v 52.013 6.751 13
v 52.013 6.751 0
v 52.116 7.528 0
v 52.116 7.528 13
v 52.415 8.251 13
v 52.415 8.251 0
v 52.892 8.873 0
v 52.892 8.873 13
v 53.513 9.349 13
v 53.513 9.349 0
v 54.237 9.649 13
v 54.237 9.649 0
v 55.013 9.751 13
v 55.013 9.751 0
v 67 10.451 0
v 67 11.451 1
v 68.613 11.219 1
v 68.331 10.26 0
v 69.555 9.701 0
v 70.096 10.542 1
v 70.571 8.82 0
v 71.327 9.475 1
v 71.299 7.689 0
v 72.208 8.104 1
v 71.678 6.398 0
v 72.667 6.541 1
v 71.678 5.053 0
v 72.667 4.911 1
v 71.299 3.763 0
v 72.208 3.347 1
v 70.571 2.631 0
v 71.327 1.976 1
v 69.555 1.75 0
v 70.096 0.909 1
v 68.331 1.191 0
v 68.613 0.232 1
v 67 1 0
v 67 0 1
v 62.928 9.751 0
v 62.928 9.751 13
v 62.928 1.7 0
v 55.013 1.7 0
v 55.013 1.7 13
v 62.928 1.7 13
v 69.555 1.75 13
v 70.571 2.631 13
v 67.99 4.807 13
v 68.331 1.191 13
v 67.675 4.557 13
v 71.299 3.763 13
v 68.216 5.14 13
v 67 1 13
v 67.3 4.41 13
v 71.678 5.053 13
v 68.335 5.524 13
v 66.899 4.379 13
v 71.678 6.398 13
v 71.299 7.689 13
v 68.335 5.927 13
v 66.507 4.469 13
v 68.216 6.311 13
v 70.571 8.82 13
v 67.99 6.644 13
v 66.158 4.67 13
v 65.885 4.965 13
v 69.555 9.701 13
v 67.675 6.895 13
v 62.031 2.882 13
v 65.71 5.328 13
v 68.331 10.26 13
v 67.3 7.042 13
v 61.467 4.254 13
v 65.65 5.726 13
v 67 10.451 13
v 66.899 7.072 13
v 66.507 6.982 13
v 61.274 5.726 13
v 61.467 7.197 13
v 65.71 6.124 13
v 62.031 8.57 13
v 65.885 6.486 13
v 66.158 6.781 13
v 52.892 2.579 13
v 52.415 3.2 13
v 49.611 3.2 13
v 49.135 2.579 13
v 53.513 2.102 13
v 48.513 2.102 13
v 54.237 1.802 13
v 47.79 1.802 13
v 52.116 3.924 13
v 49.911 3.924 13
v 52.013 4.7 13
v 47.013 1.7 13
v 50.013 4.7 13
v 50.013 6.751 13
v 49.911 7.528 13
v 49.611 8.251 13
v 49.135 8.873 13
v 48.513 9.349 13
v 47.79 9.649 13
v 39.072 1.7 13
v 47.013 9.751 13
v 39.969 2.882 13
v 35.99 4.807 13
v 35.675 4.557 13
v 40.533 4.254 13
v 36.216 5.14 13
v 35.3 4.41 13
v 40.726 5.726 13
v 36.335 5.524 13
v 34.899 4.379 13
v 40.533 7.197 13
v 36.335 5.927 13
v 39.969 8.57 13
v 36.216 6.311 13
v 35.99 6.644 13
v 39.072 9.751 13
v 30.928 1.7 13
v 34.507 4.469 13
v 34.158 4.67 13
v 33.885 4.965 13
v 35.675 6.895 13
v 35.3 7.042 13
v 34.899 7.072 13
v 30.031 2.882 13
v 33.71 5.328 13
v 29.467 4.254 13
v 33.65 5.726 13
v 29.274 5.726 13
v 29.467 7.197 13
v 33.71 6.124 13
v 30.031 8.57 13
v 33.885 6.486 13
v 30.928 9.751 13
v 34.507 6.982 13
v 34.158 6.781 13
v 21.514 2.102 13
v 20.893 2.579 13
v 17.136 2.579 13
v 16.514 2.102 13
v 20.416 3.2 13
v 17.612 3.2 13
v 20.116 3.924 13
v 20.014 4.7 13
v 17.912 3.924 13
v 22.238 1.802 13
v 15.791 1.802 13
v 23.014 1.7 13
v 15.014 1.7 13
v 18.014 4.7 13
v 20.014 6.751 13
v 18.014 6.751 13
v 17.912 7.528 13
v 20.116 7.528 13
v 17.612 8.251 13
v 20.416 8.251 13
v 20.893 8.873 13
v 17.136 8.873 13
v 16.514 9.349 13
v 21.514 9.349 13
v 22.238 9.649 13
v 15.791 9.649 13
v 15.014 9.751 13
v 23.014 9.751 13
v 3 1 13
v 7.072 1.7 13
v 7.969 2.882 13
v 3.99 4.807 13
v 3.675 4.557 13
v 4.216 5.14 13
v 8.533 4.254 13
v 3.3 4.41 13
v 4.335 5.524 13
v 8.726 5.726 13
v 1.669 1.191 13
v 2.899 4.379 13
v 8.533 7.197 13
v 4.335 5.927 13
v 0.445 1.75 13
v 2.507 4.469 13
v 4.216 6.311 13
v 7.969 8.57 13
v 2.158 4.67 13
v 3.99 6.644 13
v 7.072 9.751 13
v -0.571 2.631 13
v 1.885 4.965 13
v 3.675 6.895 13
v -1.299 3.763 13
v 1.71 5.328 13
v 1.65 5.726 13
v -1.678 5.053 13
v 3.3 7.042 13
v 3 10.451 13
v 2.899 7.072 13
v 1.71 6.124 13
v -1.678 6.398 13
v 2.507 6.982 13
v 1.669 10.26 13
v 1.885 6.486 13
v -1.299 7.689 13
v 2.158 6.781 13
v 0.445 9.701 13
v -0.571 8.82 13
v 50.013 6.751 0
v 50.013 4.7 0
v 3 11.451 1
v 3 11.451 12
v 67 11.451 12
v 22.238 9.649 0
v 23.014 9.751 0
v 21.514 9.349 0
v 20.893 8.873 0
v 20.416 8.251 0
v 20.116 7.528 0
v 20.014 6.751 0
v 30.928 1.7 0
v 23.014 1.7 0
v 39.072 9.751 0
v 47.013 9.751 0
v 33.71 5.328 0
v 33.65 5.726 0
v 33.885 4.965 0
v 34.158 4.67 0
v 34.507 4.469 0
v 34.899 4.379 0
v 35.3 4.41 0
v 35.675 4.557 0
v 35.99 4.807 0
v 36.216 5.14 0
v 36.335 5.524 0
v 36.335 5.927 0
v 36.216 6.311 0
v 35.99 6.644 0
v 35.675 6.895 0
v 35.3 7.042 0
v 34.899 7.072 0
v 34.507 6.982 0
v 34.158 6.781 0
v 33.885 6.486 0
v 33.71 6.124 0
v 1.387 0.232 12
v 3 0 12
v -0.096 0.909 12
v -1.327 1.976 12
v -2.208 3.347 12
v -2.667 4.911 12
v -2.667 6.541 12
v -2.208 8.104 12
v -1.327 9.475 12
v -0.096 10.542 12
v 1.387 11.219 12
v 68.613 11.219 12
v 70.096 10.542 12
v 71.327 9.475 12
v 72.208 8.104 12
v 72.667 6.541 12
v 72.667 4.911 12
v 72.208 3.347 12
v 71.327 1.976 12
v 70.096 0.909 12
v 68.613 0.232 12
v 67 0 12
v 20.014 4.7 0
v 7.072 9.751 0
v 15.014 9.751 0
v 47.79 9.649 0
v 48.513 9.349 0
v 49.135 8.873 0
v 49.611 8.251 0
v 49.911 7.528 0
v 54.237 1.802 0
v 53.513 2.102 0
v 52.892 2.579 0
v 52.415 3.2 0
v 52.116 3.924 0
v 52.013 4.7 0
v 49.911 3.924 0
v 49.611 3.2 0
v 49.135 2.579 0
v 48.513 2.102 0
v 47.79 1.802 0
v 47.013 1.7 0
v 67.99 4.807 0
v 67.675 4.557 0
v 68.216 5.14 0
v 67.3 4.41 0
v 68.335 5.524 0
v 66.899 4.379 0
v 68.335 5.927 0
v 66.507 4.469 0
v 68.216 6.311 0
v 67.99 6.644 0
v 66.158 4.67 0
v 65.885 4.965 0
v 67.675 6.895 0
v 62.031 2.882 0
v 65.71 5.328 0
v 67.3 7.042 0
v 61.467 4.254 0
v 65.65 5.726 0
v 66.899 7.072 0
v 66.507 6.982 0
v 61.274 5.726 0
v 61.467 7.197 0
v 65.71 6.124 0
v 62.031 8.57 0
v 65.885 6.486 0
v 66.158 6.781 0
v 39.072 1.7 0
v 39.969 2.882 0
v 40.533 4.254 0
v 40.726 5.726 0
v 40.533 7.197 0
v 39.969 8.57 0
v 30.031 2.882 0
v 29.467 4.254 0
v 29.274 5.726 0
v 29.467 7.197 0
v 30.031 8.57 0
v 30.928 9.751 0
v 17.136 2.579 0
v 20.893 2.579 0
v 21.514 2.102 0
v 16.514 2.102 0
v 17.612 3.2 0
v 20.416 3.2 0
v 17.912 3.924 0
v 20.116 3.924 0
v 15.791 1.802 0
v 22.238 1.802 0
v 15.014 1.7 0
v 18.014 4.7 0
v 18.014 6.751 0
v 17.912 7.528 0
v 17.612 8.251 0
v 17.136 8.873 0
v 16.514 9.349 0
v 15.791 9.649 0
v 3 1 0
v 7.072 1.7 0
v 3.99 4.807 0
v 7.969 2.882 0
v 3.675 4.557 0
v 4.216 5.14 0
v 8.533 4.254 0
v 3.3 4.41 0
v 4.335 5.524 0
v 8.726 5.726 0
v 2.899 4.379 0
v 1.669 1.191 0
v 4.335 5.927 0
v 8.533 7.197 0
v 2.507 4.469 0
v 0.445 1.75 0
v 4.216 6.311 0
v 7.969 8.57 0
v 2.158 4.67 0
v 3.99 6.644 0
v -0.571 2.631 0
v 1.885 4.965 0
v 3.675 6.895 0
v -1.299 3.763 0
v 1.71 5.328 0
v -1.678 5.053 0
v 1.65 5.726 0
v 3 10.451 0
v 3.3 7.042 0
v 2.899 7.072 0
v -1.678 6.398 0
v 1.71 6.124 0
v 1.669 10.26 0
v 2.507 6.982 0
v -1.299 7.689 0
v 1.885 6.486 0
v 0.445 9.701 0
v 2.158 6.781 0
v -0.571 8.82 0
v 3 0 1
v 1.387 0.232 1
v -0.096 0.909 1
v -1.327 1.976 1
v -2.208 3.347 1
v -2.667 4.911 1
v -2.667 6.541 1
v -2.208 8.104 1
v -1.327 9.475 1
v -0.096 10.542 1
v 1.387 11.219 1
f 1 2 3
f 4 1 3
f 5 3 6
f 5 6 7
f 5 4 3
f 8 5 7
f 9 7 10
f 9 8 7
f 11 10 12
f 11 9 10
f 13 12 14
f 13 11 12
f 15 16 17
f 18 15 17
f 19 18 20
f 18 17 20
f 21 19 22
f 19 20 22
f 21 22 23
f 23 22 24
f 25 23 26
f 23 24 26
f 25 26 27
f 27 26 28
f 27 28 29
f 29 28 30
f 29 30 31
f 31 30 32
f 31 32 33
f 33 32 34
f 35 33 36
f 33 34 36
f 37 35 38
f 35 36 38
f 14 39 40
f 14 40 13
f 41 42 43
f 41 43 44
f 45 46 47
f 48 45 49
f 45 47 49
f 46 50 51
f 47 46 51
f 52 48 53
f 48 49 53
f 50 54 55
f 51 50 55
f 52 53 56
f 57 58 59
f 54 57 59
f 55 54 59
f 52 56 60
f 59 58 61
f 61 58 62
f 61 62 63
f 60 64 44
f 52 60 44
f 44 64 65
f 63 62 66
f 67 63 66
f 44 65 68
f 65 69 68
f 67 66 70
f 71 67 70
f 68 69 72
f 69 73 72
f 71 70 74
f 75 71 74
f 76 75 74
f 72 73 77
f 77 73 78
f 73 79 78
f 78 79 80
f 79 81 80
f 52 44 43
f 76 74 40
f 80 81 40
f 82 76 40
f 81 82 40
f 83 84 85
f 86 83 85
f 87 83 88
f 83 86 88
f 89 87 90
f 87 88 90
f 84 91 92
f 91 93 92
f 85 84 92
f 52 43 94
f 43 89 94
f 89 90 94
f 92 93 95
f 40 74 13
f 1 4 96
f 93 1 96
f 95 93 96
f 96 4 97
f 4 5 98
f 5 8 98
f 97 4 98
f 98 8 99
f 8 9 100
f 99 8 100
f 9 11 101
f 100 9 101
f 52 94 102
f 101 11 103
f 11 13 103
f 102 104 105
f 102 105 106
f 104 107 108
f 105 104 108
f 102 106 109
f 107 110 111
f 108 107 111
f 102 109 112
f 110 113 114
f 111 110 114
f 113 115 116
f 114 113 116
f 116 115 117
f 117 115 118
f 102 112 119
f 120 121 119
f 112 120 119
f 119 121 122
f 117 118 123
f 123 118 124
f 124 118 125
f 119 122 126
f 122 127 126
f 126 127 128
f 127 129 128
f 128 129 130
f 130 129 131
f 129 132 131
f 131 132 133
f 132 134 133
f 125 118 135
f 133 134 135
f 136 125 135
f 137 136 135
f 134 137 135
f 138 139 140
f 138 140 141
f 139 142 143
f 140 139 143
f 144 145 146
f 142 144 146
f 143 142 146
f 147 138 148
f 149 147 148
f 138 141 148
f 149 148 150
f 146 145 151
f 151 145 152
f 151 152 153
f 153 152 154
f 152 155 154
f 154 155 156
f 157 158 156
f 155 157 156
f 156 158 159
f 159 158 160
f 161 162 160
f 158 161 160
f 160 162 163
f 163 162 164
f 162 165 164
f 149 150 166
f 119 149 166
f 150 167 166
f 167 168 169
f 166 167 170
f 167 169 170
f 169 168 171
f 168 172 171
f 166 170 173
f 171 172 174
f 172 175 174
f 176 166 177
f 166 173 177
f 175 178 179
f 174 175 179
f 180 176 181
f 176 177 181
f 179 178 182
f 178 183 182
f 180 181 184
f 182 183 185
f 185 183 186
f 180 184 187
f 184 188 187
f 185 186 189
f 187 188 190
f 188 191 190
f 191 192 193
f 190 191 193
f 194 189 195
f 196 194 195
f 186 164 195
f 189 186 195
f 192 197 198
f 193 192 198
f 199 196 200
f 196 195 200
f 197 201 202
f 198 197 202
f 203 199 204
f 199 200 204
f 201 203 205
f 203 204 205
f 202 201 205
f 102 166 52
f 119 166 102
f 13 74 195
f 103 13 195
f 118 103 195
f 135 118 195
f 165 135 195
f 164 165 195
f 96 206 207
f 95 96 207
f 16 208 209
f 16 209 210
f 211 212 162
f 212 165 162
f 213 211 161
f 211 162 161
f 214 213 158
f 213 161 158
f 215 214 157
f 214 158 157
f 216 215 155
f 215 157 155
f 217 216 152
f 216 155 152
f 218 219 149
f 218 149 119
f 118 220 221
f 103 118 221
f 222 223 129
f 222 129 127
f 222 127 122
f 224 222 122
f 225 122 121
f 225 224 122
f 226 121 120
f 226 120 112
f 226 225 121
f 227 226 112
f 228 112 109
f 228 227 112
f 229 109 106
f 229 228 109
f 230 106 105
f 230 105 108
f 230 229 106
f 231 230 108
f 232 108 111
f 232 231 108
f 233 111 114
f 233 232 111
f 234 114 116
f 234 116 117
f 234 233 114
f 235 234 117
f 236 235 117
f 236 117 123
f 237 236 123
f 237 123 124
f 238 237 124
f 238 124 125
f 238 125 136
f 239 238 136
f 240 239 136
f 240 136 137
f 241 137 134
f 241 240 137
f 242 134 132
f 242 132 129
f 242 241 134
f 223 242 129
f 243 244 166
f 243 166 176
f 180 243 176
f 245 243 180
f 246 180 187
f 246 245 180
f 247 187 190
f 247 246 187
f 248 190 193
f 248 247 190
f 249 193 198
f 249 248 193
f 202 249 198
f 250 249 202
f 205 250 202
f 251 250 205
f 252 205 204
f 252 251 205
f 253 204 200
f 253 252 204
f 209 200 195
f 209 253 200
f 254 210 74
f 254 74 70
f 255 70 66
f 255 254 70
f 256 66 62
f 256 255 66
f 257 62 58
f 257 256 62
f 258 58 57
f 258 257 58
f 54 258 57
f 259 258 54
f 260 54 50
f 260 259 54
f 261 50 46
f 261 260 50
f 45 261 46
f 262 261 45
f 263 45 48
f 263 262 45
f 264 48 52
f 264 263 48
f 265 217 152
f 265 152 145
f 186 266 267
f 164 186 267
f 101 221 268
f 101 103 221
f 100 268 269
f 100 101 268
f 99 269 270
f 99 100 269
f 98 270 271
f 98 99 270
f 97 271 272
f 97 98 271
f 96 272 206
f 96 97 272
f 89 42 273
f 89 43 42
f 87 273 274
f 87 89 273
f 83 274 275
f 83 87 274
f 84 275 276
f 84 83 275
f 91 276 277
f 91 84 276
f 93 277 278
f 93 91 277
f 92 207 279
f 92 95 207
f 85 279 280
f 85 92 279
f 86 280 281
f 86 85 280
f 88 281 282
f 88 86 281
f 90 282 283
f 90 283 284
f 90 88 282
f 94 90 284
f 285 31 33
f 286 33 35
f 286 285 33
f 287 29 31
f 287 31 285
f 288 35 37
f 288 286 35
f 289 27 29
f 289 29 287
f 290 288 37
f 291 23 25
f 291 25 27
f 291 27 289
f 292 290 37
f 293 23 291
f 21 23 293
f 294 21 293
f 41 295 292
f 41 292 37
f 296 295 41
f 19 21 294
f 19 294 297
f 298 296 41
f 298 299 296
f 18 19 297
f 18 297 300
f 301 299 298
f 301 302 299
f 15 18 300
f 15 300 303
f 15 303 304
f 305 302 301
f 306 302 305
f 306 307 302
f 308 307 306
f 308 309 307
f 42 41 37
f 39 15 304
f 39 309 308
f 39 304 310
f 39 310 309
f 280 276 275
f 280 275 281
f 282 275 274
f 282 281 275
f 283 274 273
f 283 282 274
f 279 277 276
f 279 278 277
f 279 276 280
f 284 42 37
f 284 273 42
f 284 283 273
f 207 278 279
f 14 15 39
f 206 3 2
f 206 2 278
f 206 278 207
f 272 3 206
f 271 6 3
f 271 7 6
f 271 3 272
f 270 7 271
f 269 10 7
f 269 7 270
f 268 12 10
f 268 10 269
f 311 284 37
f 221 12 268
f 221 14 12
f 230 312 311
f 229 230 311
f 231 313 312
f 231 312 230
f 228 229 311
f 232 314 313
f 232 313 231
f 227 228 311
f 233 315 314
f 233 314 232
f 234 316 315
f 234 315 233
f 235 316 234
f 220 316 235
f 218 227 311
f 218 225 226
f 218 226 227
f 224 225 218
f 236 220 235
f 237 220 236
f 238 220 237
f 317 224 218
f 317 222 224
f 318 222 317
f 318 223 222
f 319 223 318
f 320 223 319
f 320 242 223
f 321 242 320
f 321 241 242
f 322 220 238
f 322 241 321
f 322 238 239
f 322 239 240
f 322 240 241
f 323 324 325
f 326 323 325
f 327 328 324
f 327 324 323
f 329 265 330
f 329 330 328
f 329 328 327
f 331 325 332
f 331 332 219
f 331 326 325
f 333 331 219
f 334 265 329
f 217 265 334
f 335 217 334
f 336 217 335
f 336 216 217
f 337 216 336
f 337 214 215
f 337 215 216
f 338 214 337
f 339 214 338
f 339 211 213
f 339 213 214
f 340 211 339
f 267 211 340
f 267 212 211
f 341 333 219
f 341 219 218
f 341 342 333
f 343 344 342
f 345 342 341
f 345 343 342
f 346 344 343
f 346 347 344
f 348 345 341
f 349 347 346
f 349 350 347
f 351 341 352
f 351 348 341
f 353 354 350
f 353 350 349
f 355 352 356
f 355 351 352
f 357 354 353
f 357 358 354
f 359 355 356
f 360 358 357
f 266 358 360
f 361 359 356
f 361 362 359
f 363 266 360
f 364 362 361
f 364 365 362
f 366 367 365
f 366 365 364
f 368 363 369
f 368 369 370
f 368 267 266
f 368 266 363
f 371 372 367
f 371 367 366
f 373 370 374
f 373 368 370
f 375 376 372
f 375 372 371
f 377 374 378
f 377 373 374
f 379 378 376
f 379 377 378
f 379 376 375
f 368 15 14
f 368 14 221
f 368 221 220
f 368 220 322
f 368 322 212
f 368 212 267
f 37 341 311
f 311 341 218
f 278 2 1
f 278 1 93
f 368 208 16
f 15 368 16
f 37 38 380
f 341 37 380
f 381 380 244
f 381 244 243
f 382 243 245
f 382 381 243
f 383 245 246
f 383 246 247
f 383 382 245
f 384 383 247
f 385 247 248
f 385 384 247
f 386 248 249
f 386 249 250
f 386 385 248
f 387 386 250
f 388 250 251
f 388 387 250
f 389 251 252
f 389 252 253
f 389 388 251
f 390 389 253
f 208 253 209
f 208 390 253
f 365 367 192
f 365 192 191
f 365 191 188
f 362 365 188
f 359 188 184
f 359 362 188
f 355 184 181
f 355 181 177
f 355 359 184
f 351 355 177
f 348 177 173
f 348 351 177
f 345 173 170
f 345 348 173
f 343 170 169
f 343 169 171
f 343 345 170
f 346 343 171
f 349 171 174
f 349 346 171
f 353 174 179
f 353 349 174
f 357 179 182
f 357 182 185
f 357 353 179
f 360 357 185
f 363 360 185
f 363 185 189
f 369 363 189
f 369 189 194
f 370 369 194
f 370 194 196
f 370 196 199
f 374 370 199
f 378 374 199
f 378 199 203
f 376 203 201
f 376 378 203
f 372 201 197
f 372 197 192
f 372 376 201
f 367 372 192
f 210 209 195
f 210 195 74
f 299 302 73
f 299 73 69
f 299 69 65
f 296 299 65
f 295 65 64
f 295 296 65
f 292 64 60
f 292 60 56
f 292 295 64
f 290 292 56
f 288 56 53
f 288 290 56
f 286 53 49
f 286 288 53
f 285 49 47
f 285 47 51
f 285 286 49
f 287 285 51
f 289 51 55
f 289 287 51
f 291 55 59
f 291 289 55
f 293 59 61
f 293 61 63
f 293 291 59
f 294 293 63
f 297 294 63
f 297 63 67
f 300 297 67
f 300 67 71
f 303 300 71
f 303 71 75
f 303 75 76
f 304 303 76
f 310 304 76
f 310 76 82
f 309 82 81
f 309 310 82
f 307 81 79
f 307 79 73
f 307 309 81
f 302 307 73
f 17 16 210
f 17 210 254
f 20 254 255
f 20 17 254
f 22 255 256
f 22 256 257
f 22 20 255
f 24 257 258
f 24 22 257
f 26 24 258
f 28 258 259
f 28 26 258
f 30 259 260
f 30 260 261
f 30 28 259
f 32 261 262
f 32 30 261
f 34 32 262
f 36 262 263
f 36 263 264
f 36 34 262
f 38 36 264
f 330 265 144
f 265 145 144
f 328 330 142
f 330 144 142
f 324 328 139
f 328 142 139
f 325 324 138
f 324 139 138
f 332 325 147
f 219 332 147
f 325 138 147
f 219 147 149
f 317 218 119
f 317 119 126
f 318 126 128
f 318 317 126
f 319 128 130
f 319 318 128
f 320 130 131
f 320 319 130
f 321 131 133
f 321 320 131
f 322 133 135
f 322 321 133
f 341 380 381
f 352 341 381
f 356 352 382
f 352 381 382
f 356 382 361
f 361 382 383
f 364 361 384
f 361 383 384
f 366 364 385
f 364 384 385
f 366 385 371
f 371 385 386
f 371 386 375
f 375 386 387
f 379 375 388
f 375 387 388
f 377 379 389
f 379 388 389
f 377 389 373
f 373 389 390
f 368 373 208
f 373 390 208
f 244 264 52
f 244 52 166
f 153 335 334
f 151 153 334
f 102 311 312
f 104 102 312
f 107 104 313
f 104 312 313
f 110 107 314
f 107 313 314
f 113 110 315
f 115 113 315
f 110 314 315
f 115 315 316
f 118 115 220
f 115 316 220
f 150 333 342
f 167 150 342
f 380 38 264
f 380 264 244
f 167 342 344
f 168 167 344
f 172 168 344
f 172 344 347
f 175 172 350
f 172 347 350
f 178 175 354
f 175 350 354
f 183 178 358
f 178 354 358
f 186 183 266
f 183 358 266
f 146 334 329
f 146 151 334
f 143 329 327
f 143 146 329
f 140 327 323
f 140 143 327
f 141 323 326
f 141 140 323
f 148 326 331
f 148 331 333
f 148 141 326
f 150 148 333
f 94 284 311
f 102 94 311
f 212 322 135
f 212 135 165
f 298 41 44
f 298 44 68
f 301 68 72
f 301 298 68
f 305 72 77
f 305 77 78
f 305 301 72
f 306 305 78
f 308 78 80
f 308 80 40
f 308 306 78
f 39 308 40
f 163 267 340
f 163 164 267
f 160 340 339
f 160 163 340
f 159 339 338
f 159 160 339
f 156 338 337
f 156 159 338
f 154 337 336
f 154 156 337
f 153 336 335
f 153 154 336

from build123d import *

# Parameters (mm, degrees)
SKETCH_1_R      = 1.35
EXTRUDE_3_DEPTH = 13
FILLET_1_R      = 3
CHAMFER_1_SIZE  = 1


with BuildPart() as part:
    # 草图1 → 凸台-拉伸3 (new body)
    with BuildSketch(Plane.XY):
        with BuildLine():
            Line((3, 11.4514), (35, 11.4514))
            Line((35, 11.4514), (67, 11.4514))
            ThreePointArc((67, 11.4514), (72.7257, 5.7257), (67, 0))
            Line((67, 0), (35, 0))
            Line((35, 0), (3, 0))
            ThreePointArc((3, 0), (-2.7257, 5.7257), (3, 11.4514))
        make_face()
        with Locations(Location((35, 5.7257, 0), (0, 0, 180))):
            Circle(SKETCH_1_R, mode=Mode.SUBTRACT)
        with Locations(Location((3, 5.7257, 0), (0, 0, 180))):
            Circle(SKETCH_1_R, mode=Mode.SUBTRACT)
        with Locations(Location((67, 5.7257, 0), (0, 0, 180))):
            Circle(SKETCH_1_R, mode=Mode.SUBTRACT)
        with BuildLine():
            Line((7.071532881, 9.7514), (18.014251374, 9.7514))
            Line((18.014251374, 9.7514), (18.014251374, 1.7))
            Line((18.014251374, 1.7), (7.071532881, 1.7))
            ThreePointArc((7.071532881, 1.7), (8.7257, 5.7257), (7.071532881, 9.7514))
        make_face(mode=Mode.SUBTRACT)
        with BuildLine():
            Line((20.014251374, 9.7514), (20.014251374, 1.7))
            Line((20.014251374, 1.7), (30.928467119, 1.7))
            ThreePointArc((30.928467119, 1.7), (29.2743, 5.7257), (30.928467119, 9.7514))
            Line((30.928467119, 9.7514), (20.014251374, 9.7514))
        make_face(mode=Mode.SUBTRACT)
        with BuildLine():
            Line((39.071532881, 9.7514), (50.013401562, 9.7514))
            Line((50.013401562, 9.7514), (50.013401562, 1.7))
            Line((50.013401562, 1.7), (39.071532881, 1.7))
            ThreePointArc((39.071532881, 1.7), (40.7257, 5.7257), (39.071532881, 9.7514))
        make_face(mode=Mode.SUBTRACT)
        with BuildLine():
            Line((62.928467119, 9.7514), (52.013401562, 9.7514))
            Line((52.013401562, 9.7514), (52.013401562, 1.7))
            Line((52.013401562, 1.7), (62.928467119, 1.7))
            ThreePointArc((62.928467119, 1.7), (61.2743, 5.7257), (62.928467119, 9.7514))
        make_face(mode=Mode.SUBTRACT)
    extrude(amount=EXTRUDE_3_DEPTH)

    # 圆角1
    fillet_1_edges = [part.edges().sort_by_distance(p)[0] for p in [
        (20.014251374, 9.7514, 6.5),
        (20.014251374, 1.7, 6.5),
        (50.013401562, 1.7, 6.5),
        (50.013401562, 9.7514, 6.5),
        (52.013401562, 9.7514, 6.5),
        (52.013401562, 1.7, 6.5),
        (18.014251374, 1.7, 6.5),
        (18.014251374, 9.7514, 6.5),
    ]]
    fillet(fillet_1_edges, radius=FILLET_1_R)

    # 倒角1
    chamfer_1_edges = [part.edges().sort_by_distance(p)[0] for p in [
        (72.7257, 5.7257, 13),
        (35, 11.4514, 13),
        (-2.7257, 5.7257, 13),
        (35, 11.4514, 0),
        (72.7257, 5.7257, 0),
        (35, 0, 0),
        (-2.7257, 5.7257, 0),
        (35, 0, 13),
    ]]
    chamfer(chamfer_1_edges, length=CHAMFER_1_SIZE)


solid = part.part
